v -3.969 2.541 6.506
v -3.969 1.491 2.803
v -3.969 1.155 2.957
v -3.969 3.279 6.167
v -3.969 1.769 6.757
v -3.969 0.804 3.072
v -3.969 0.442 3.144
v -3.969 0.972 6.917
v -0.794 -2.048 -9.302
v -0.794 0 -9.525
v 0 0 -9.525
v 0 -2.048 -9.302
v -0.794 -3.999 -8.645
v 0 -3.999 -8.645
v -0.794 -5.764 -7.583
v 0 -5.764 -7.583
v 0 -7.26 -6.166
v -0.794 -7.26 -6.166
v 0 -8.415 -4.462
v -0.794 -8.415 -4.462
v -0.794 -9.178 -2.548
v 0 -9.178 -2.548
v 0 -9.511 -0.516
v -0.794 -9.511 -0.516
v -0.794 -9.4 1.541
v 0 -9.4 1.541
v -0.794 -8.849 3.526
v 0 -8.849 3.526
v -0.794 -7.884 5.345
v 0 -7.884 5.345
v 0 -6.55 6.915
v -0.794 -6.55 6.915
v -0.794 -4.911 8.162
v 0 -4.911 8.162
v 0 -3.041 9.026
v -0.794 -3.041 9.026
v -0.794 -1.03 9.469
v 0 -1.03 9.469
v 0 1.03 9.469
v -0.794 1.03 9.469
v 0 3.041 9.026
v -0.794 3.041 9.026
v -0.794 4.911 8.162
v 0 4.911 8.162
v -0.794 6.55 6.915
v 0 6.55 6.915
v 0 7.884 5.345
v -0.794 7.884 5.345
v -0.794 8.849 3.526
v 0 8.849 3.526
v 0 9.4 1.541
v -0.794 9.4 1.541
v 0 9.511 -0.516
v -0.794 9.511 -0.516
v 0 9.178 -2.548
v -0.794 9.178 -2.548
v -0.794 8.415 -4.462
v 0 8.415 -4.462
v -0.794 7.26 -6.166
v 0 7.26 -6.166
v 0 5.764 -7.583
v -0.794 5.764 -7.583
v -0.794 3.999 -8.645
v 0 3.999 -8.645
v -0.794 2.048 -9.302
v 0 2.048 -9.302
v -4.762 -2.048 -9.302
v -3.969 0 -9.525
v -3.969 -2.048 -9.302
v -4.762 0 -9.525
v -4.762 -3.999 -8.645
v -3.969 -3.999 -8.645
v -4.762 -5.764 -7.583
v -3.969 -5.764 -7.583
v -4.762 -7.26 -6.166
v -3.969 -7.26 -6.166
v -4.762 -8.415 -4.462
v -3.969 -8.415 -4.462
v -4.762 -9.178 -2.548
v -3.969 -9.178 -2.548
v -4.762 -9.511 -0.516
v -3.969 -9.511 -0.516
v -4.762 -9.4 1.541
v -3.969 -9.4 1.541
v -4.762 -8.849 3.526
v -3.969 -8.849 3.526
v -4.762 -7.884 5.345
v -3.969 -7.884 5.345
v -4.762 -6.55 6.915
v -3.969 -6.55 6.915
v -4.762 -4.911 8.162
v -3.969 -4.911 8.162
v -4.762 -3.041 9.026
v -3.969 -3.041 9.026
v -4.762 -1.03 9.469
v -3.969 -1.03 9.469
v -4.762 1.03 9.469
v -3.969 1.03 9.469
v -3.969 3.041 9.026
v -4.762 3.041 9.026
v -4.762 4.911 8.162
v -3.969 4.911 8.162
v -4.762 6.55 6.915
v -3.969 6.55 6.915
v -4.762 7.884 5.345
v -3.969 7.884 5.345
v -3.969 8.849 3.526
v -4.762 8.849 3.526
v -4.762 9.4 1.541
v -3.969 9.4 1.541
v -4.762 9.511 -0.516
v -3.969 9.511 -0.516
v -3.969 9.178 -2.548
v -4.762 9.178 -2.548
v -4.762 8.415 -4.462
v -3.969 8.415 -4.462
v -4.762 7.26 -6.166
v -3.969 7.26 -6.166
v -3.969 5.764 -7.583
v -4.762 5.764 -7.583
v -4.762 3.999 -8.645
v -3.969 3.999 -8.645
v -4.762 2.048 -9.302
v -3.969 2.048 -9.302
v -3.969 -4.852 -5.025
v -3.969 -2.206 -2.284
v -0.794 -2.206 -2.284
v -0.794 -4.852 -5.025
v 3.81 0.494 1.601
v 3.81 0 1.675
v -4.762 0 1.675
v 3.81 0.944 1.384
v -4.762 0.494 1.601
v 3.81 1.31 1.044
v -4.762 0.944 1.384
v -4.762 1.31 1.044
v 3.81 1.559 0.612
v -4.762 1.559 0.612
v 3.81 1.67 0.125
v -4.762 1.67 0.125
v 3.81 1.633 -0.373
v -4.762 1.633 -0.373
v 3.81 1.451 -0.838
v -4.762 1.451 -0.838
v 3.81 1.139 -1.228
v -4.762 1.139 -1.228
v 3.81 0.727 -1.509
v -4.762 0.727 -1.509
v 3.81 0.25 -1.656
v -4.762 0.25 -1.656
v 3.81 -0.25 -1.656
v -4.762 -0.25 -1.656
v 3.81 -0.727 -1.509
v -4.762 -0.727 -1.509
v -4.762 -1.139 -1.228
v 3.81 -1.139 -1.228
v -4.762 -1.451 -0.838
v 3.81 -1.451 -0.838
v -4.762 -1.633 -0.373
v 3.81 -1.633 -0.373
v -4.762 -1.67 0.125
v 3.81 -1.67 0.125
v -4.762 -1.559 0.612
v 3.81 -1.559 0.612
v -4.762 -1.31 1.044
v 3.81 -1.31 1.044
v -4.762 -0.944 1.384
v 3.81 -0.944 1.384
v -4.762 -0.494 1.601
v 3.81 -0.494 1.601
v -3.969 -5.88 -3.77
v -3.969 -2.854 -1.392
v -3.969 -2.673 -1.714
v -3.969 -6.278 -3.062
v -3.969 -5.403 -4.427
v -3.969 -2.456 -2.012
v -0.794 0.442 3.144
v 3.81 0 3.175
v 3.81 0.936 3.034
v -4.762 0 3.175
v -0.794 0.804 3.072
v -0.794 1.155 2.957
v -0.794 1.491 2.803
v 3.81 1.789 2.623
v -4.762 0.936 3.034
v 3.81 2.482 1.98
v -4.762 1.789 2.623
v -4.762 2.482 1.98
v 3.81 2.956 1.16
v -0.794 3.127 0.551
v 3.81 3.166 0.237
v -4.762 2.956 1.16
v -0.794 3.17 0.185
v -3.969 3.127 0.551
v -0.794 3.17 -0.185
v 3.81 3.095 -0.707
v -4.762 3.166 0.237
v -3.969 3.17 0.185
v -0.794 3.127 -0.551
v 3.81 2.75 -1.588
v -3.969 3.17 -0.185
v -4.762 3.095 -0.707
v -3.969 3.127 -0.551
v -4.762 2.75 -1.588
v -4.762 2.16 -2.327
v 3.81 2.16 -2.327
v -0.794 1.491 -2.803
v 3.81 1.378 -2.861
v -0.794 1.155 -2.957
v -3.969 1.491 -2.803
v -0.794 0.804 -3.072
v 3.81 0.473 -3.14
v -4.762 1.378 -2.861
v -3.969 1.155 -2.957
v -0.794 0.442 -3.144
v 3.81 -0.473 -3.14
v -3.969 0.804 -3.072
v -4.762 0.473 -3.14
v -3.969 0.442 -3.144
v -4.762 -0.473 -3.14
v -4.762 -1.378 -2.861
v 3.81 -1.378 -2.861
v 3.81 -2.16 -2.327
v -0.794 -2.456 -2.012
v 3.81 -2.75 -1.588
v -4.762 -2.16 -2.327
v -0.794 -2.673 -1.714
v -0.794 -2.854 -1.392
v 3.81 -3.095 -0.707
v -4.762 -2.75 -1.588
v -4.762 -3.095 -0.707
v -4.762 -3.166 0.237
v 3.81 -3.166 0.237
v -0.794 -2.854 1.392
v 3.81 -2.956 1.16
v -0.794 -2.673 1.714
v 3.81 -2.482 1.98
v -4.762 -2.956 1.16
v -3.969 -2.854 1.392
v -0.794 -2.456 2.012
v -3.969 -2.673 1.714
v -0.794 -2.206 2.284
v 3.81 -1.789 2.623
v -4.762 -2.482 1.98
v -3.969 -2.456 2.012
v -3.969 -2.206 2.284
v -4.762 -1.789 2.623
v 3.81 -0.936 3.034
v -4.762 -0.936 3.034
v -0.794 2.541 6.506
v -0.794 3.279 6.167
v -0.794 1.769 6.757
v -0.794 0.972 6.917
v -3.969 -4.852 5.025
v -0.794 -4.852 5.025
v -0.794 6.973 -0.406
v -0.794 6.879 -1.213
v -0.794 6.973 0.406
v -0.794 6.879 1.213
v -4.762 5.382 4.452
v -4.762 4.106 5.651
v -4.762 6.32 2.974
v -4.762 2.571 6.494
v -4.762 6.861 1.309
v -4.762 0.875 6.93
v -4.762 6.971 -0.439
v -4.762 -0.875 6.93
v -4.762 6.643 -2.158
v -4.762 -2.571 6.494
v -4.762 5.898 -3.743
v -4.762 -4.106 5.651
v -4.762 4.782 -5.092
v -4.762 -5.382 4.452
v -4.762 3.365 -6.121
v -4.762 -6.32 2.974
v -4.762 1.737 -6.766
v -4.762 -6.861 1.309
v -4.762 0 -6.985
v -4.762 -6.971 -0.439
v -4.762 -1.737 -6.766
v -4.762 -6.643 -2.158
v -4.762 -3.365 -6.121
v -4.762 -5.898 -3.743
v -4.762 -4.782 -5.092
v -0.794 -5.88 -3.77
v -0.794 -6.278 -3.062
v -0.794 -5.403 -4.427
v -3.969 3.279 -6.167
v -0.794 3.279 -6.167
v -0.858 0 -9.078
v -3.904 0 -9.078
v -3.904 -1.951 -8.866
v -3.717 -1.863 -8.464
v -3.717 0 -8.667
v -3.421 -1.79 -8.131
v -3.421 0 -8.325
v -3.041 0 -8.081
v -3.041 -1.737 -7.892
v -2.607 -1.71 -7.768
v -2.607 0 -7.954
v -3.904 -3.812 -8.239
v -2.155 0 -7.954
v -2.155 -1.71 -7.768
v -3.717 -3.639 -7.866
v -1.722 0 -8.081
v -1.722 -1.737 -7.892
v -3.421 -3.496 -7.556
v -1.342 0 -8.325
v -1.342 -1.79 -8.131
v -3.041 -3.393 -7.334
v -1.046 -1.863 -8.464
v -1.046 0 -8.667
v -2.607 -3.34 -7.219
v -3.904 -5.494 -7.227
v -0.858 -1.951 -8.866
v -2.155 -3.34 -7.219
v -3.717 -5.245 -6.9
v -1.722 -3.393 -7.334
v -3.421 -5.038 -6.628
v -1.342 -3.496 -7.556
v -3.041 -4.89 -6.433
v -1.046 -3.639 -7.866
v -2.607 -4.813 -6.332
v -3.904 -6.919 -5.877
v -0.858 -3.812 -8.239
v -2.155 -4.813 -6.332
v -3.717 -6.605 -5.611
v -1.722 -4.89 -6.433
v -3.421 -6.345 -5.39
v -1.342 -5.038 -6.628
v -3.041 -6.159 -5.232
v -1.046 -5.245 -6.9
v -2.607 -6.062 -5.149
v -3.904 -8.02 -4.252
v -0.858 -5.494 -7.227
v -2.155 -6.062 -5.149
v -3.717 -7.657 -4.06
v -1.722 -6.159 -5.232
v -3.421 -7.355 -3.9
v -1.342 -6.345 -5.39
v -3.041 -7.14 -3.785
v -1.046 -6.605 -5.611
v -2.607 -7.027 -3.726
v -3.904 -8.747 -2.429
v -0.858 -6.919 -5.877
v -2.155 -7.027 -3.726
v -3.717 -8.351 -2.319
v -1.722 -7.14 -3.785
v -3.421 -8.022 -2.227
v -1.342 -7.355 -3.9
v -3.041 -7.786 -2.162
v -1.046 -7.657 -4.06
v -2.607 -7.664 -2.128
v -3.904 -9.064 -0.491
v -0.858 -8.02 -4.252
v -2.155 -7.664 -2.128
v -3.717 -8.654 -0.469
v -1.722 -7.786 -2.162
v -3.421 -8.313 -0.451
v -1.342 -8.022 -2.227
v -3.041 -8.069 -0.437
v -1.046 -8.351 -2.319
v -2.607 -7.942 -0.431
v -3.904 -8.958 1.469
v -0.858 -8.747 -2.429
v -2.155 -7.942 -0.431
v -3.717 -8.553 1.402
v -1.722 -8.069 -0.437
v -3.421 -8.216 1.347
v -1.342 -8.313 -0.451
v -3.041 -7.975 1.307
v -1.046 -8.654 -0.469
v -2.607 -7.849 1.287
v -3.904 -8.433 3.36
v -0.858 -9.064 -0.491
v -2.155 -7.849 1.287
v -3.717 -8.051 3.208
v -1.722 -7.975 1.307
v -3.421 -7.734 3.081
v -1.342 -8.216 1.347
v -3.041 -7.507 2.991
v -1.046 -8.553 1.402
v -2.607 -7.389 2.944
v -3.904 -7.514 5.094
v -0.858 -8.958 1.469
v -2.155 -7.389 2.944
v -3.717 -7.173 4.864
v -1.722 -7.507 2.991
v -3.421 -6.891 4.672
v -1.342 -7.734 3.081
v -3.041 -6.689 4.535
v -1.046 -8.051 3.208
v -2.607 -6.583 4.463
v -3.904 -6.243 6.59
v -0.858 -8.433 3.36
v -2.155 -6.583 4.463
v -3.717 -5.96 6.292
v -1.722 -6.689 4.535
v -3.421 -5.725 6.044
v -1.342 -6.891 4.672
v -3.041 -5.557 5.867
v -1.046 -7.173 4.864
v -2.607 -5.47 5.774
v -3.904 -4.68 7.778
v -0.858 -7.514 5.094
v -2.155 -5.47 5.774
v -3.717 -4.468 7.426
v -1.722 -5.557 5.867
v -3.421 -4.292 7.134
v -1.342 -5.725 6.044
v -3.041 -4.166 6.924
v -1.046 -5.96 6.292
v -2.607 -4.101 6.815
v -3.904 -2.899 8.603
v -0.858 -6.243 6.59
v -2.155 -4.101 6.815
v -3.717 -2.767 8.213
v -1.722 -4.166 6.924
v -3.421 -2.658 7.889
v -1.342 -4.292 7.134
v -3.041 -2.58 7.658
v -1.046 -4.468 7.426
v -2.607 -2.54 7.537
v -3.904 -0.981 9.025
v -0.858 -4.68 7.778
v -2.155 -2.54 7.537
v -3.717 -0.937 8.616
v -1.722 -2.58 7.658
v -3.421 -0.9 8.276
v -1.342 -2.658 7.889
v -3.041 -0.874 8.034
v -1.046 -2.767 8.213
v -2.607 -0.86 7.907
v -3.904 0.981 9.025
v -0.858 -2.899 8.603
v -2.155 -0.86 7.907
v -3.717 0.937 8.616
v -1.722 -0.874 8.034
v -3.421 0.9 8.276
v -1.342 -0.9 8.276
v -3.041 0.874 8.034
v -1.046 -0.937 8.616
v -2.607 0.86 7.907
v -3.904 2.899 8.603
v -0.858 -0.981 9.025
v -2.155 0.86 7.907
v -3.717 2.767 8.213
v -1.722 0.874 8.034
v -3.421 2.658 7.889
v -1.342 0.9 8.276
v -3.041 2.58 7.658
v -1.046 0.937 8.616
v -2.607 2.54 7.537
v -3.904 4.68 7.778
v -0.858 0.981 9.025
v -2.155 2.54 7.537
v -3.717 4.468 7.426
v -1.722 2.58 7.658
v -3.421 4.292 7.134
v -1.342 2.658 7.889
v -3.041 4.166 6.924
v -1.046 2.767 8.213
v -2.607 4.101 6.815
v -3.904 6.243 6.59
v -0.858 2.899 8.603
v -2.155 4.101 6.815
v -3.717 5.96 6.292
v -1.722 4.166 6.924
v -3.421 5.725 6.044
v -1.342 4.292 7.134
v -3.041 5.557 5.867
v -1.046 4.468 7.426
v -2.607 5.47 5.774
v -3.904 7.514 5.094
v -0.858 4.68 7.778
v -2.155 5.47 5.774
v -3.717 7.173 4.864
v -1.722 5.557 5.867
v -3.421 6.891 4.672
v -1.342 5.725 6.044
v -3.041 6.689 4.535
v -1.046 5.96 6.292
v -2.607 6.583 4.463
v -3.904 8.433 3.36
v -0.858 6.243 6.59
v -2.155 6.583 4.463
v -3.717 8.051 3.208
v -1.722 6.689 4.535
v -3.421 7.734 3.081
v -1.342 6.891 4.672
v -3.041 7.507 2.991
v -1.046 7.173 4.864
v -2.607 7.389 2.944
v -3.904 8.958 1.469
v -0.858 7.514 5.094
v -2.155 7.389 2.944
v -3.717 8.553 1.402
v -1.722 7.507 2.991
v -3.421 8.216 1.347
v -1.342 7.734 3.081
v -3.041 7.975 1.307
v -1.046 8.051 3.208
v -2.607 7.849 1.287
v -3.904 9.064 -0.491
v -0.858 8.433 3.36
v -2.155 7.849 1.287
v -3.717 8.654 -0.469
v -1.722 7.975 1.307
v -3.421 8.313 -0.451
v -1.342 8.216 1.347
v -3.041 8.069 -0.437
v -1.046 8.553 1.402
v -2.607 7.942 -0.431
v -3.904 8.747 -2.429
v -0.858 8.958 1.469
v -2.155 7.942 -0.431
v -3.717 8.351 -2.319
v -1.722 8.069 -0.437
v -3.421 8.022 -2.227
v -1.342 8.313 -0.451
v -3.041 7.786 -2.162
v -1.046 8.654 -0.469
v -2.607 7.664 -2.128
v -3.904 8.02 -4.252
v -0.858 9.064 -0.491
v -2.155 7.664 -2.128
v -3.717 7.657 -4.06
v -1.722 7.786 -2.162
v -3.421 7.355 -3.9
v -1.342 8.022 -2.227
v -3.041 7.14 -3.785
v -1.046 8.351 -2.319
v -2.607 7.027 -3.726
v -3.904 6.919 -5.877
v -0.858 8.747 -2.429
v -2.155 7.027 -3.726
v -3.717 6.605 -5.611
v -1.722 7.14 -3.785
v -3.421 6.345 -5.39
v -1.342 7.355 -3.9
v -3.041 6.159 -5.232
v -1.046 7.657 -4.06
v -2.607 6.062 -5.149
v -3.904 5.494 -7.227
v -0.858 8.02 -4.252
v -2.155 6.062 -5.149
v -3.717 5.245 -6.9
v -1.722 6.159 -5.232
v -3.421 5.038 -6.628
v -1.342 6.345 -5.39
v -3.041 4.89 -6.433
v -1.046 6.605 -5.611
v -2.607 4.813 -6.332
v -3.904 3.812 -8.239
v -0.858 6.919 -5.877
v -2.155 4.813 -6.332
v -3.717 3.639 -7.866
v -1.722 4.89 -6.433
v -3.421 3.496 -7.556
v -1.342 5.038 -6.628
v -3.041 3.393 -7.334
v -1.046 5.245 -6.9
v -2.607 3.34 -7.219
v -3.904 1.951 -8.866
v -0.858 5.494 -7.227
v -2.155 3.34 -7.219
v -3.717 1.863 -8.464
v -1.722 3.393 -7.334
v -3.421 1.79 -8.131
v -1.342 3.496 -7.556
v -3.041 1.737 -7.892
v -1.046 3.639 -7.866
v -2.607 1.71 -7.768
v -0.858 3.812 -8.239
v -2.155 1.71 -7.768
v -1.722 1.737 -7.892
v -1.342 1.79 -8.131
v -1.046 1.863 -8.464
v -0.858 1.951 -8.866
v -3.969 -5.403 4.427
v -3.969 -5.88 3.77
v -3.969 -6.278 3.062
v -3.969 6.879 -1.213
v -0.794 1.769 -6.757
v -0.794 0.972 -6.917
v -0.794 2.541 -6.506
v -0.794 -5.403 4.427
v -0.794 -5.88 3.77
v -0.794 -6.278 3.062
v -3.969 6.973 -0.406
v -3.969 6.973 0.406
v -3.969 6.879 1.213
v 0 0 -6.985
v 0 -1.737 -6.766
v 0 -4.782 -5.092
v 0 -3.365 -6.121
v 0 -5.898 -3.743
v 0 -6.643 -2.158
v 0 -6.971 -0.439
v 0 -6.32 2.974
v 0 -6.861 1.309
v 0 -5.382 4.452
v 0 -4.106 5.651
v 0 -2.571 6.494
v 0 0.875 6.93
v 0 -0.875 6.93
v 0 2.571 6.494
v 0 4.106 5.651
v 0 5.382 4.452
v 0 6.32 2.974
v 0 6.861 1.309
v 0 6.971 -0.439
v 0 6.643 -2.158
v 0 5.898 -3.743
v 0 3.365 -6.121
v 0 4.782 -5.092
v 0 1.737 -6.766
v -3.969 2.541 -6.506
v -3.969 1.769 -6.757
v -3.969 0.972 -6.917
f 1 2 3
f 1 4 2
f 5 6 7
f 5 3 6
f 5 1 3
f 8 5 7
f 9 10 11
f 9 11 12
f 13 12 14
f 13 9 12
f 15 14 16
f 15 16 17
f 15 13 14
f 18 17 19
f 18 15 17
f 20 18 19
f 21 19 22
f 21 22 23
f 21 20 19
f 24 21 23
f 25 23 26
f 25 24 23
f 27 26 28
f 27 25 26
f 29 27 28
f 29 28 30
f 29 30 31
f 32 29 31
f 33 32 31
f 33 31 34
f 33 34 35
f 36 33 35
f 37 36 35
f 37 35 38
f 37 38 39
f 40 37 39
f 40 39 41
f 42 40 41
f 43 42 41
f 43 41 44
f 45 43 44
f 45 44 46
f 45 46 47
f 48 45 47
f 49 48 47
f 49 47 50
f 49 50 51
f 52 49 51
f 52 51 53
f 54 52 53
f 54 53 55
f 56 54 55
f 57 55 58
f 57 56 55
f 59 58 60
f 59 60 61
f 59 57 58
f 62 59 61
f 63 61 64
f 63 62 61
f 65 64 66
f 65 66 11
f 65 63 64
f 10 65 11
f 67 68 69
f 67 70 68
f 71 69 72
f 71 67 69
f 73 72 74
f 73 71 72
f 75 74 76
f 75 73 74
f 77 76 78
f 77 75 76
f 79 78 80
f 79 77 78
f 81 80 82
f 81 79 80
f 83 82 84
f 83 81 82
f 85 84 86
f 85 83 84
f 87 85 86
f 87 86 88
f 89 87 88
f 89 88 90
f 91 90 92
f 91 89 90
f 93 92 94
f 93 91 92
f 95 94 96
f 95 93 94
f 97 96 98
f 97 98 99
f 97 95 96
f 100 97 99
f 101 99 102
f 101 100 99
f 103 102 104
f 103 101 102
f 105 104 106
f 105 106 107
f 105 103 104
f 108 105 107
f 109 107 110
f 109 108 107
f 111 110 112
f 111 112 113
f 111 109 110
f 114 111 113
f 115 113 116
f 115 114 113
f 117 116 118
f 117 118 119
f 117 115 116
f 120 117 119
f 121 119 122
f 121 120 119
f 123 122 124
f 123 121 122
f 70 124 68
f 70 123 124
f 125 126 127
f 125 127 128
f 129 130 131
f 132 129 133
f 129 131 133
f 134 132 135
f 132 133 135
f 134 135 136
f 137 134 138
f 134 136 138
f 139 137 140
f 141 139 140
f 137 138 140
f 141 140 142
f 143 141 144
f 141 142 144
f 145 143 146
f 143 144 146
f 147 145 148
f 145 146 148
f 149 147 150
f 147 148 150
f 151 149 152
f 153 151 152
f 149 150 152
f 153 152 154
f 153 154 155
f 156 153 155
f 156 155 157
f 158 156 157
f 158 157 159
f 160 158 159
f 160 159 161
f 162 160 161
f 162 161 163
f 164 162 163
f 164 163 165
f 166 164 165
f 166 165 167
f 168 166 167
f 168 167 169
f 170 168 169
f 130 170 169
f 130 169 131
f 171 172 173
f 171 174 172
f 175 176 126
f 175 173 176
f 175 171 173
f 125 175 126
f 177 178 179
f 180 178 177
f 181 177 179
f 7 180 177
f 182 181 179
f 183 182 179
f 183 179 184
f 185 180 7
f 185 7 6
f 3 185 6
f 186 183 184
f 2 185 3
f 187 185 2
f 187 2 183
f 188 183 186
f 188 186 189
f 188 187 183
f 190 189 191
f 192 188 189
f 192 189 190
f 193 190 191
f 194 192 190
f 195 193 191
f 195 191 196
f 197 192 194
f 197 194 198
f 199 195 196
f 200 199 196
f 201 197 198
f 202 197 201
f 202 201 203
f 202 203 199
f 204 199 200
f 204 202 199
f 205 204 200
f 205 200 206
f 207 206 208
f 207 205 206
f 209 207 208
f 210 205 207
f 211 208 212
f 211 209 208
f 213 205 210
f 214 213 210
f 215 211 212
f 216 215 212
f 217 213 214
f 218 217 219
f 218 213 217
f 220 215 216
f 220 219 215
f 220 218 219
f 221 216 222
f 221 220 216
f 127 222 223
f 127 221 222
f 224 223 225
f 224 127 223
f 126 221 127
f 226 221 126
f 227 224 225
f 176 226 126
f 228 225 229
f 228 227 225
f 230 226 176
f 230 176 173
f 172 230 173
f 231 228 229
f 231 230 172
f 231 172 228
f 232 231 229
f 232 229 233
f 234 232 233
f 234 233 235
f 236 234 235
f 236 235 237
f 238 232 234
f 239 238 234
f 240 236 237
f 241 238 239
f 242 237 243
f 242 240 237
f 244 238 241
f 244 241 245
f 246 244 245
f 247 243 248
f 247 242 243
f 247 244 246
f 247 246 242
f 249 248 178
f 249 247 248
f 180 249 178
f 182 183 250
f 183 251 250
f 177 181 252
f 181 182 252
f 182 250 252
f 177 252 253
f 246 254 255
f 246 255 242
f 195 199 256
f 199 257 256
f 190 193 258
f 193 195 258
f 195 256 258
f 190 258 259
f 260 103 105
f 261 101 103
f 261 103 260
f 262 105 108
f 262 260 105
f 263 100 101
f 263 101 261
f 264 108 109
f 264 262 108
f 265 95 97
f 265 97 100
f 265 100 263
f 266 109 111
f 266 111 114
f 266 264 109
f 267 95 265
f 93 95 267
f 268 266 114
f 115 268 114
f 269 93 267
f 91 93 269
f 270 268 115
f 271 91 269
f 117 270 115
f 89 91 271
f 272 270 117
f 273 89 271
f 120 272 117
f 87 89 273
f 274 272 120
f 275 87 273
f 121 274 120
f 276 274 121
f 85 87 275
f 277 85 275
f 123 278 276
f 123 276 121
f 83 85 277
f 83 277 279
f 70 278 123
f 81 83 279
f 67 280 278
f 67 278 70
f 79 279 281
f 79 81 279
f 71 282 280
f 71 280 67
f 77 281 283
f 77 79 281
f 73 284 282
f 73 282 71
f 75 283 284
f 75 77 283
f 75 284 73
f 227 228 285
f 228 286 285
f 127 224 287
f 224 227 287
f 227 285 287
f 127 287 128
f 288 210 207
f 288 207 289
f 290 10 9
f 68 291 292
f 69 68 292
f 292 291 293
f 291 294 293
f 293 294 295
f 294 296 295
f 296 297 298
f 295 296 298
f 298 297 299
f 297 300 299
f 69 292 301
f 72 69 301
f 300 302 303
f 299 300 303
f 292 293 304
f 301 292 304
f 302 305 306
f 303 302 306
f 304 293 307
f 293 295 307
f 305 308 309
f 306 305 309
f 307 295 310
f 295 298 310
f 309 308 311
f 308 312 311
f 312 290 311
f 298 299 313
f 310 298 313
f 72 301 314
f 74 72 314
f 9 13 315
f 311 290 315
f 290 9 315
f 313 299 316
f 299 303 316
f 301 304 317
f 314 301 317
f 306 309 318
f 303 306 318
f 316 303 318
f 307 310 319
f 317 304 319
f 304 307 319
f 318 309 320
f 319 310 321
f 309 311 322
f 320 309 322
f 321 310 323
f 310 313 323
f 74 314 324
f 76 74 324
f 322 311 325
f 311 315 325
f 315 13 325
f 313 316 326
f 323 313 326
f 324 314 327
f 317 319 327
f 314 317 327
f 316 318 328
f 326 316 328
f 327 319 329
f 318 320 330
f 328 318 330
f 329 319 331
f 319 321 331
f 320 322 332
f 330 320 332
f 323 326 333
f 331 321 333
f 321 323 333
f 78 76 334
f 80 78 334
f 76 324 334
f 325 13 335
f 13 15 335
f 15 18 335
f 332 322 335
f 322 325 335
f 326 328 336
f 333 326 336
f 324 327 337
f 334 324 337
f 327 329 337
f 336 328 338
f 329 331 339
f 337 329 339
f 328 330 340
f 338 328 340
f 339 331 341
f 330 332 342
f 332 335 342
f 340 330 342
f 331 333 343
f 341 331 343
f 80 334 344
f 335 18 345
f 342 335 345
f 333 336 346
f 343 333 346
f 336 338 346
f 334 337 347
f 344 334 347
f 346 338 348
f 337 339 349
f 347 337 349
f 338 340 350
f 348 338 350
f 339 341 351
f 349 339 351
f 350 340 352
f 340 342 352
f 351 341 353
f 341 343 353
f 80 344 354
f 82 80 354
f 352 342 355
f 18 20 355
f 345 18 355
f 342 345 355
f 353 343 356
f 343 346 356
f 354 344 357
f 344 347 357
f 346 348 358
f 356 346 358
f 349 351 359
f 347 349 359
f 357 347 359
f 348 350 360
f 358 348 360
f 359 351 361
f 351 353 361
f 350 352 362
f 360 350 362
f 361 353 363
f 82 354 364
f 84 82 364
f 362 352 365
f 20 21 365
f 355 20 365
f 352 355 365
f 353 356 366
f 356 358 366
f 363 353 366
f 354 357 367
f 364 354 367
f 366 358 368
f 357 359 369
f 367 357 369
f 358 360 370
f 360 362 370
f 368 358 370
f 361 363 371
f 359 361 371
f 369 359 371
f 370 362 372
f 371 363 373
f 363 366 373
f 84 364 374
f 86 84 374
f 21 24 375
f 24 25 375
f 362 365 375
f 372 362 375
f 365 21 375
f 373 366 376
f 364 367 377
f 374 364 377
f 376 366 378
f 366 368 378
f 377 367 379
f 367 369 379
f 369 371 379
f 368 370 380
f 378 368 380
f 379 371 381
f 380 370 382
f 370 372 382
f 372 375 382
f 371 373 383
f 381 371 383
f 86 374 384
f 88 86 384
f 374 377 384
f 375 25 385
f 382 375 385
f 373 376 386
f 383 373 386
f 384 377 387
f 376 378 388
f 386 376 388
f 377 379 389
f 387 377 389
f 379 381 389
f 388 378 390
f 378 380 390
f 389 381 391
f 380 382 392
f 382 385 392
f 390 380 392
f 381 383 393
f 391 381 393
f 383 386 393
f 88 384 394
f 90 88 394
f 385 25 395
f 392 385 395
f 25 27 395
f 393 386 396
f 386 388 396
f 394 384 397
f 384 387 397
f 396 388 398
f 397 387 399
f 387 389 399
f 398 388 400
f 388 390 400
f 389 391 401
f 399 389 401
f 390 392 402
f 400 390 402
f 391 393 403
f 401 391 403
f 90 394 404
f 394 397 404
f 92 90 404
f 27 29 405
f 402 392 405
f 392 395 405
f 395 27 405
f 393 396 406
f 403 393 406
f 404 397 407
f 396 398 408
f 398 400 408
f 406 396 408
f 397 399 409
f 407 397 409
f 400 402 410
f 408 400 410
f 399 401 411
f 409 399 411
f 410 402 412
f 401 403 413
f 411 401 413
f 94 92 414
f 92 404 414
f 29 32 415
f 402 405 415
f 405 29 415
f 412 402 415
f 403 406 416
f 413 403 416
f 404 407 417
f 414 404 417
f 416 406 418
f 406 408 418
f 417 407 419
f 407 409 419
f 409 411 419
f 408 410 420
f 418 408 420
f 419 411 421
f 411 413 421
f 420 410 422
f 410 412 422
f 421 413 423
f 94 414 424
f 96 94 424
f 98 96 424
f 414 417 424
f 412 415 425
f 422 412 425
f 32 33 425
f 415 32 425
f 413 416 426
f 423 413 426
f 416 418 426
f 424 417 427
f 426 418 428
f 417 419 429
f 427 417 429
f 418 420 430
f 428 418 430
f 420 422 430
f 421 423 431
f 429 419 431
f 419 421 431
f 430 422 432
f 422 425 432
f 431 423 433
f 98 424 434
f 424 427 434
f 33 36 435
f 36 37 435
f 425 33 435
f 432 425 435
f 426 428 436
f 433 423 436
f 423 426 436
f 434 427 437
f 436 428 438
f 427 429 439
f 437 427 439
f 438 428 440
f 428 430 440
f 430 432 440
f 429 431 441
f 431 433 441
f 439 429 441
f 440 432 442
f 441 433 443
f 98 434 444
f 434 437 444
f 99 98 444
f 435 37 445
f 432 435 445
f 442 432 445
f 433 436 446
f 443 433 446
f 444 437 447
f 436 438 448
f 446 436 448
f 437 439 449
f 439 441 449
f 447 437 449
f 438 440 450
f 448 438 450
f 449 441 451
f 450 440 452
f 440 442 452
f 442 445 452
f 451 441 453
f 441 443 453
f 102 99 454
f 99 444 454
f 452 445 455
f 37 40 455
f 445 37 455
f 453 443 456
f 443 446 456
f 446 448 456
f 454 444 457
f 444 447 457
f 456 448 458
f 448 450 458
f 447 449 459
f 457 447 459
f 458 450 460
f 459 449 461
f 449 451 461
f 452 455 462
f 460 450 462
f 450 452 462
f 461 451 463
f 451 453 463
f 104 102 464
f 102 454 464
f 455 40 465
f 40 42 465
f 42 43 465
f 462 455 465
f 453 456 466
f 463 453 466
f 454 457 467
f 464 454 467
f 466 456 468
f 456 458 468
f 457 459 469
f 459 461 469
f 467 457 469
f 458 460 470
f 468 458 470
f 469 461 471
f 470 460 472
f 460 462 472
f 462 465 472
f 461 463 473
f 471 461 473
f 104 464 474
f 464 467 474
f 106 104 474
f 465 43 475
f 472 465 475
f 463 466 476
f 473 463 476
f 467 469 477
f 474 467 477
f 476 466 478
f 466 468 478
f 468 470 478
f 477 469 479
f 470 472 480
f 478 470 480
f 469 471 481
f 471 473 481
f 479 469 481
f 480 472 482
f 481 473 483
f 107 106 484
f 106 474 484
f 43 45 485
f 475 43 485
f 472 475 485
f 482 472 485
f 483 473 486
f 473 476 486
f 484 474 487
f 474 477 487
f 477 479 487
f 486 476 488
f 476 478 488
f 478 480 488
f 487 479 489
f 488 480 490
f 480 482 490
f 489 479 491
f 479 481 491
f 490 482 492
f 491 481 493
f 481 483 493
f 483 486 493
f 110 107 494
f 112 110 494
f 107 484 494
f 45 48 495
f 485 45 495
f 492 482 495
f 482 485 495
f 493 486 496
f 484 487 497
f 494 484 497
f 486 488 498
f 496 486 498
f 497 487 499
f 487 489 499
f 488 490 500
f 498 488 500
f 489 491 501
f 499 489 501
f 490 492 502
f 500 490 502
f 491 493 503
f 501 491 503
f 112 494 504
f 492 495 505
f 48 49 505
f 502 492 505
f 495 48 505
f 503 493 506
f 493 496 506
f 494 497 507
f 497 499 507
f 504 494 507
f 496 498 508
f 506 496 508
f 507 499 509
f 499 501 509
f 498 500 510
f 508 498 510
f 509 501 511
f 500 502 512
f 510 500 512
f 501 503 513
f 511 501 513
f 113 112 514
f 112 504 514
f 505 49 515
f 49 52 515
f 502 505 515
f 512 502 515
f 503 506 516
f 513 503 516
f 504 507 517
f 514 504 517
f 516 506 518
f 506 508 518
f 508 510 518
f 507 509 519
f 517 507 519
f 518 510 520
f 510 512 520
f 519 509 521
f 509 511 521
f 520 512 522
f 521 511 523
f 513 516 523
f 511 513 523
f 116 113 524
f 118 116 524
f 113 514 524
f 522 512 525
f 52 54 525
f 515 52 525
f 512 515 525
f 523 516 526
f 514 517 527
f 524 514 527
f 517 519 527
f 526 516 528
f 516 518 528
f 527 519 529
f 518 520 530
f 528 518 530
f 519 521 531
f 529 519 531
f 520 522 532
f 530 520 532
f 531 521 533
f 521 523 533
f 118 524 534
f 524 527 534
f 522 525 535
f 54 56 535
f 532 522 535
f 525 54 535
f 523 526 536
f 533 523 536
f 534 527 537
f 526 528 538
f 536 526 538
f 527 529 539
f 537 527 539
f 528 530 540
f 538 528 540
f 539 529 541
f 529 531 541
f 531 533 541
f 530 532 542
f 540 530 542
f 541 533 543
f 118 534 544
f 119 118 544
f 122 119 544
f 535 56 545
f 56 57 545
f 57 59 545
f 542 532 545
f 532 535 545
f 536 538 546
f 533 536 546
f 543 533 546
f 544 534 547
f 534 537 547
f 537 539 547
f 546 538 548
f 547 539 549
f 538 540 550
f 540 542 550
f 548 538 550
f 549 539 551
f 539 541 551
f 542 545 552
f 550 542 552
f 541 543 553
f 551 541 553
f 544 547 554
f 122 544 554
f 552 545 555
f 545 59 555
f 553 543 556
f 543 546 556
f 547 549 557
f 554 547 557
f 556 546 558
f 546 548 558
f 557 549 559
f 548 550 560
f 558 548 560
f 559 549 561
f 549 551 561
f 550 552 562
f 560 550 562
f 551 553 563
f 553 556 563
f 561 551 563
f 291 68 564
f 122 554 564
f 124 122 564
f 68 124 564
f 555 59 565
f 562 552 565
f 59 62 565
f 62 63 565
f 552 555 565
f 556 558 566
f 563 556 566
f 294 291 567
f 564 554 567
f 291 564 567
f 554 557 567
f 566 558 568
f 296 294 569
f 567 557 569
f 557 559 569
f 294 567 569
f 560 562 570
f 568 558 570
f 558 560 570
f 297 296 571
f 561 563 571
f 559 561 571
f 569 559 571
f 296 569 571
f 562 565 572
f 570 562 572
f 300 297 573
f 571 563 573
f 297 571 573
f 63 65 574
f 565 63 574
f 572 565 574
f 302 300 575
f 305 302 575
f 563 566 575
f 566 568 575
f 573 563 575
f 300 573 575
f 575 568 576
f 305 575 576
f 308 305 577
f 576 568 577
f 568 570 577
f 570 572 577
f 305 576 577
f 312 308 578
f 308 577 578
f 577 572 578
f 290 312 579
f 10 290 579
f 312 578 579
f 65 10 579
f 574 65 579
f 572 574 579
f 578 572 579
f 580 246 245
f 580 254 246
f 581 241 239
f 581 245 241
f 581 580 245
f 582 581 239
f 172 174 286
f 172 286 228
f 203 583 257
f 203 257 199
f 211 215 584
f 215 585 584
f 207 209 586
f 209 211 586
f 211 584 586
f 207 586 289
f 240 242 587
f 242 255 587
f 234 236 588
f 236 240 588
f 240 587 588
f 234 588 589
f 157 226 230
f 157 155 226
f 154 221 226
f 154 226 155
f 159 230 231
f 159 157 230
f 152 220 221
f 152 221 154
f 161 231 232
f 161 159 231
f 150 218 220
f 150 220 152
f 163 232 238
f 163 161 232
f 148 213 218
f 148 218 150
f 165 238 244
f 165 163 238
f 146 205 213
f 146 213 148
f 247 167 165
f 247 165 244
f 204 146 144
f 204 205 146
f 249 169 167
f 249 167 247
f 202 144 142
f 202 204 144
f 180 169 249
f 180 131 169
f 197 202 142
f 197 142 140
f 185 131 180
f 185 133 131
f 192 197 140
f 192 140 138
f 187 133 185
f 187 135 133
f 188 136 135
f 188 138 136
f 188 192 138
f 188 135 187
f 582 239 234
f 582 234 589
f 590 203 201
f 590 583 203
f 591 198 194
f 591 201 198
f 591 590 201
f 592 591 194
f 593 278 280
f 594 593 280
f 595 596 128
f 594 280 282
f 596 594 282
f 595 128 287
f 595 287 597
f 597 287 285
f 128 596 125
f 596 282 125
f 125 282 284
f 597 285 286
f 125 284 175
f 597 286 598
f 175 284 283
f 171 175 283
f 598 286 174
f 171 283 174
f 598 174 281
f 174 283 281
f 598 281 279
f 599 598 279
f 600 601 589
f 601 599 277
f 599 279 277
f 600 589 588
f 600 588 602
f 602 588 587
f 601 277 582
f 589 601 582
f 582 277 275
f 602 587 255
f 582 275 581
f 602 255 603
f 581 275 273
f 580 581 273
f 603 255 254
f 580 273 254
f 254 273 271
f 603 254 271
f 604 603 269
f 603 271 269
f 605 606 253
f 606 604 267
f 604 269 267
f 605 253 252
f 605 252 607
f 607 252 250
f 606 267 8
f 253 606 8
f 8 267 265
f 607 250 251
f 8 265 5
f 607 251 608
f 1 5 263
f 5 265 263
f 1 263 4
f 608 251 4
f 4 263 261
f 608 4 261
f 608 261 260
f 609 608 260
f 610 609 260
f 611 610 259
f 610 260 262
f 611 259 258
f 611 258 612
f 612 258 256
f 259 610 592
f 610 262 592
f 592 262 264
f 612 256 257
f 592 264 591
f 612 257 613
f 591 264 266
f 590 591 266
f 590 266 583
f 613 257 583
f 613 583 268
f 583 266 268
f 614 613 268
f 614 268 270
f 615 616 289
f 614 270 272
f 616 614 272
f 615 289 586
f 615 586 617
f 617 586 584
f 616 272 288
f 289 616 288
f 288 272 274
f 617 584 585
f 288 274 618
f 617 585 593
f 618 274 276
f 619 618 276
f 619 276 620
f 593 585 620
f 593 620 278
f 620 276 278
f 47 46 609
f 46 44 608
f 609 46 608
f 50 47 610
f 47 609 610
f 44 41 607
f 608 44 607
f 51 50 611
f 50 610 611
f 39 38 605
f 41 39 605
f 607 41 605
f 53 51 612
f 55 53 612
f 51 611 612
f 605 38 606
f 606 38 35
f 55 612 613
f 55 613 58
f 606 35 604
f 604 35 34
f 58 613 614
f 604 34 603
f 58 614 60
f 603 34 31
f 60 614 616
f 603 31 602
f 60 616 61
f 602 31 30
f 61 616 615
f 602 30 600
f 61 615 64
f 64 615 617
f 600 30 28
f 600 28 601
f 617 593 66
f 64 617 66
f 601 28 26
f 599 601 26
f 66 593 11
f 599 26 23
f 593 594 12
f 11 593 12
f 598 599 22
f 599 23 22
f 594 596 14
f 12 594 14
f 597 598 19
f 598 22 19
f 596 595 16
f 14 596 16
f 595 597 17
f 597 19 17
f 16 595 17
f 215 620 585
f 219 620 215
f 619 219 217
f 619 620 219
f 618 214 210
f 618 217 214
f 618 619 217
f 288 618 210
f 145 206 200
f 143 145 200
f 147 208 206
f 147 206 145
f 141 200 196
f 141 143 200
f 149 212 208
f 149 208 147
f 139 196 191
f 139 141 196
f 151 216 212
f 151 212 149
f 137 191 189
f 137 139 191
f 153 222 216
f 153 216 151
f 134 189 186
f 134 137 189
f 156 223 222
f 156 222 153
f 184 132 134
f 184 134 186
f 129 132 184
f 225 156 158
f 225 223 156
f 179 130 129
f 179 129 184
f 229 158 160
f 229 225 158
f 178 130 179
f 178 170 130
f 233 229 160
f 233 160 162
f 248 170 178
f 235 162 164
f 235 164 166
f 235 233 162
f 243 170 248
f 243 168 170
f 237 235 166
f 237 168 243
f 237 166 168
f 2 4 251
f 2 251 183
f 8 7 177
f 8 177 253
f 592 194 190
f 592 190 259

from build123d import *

# Parameters (mm, degrees)
SKETCH1_R           = 3.175
BOSS_EXTRUDE1_DEPTH = 3.81
BOSS_EXTRUDE2_START = 4.7625
SKETCH4_R           = 9.525
SKETCH4_R_2         = 6.985
SKETCH4_R_3         = 3.175
BOSS_EXTRUDE2_DEPTH = 4.7625
BOSS_EXTRUDE3_START = -0.79375
BOSS_EXTRUDE3_DEPTH = 3.175
CIRPATTERN1_COUNT   = 5
SKETCH6_R           = 1.5875
SKETCH7_R           = 1.675
CUT_EXTRUDE1_DEPTH  = 16.96680952


with BuildPart() as part:
    # Sketch1 → Boss-Extrude1 (new body)
    with BuildSketch(Plane(origin=(0, 0, 0), x_dir=(0, 0, -1), z_dir=(1, 0, 0))):
        with Locations(Location((0, 0, 0), (0, 0, 180))):
            Circle(SKETCH1_R)
    extrude(amount=BOSS_EXTRUDE1_DEPTH)

    # Sketch4 → Boss-Extrude2 (add)
    # profile 1 of 2: a face of its own
    with BuildSketch(Plane.ZY.offset(BOSS_EXTRUDE2_START)):
        with Locations(Location((0, 0, 0), (0, 0, 180))):
            Circle(SKETCH4_R)
        with Locations(Location((0, 0, 0), (0, 0, 180))):
            Circle(SKETCH4_R_2, mode=Mode.SUBTRACT)
    # profile 2 of 2: a face of its own
    with BuildSketch(Plane.ZY.offset(BOSS_EXTRUDE2_START)):
        Circle(SKETCH4_R_3)
    extrude(amount=-BOSS_EXTRUDE2_DEPTH)


with BuildPart() as boss_extrude2_piece_1:
    # of the separate pieces the step leaves, piece 1, a body of its own (boss_extrude2_pieces)
    add(part.part.solids().sort_by_distance((-4.7625, 0, -9.525))[0])



with BuildPart() as boss_extrude2_piece_2:
    # of the separate pieces the step leaves, piece 2, a body of its own (boss_extrude2_pieces)
    add(part.part.solids().sort_by_distance((3.81, 0, 3.175))[0])


with BuildPart() as boss_extrude2_piece_1_1:
    add(boss_extrude2_piece_1.part)

    add(boss_extrude2_piece_2.part)  # Boss-Extrude3 merges Boss-Extrude2 piece 2
    # Sketch5 → Boss-Extrude3 (add)
    with BuildSketch(Plane.ZY.offset(4.7625).offset(BOSS_EXTRUDE3_START)):
        with BuildLine():
            Line((0, 0), (1.212932521, 6.878882155))
            ThreePointArc((1.212932521, 6.878882155), (0, 6.985), (-1.212932521, 6.878882155))
            Line((-1.212932521, 6.878882155), (0, 0))
        make_face()
    boss_extrude3 = extrude(amount=-BOSS_EXTRUDE3_DEPTH)

    # CirPattern1: Boss-Extrude3 ×5 about axis
    cirpattern1_axis = Axis((0, 0, 0), (1, 0, 0))
    for i in range(1, CIRPATTERN1_COUNT):
        add(boss_extrude3.rotate(cirpattern1_axis, i * 360 / CIRPATTERN1_COUNT))

    # Sketch6 → Cut-Revolve1 (revolve, cut)
    with BuildSketch(Plane(origin=(0, 0, 0), x_dir=(1, 0, 0), z_dir=(0, 1, 0))):
        with Locations((-2.38125, 9.525)):
            Circle(SKETCH6_R)
    revolve(axis=Axis((3.81, 0, 0), (-1, 0, 0)), mode=Mode.SUBTRACT)

    # Sketch7 → Cut-Extrude1 (cut, through all)
    with BuildSketch(Plane.ZY.offset(4.7625)):
        Circle(SKETCH7_R)
    extrude(amount=-CUT_EXTRUDE1_DEPTH, mode=Mode.SUBTRACT)


solid = boss_extrude2_piece_1_1.part
